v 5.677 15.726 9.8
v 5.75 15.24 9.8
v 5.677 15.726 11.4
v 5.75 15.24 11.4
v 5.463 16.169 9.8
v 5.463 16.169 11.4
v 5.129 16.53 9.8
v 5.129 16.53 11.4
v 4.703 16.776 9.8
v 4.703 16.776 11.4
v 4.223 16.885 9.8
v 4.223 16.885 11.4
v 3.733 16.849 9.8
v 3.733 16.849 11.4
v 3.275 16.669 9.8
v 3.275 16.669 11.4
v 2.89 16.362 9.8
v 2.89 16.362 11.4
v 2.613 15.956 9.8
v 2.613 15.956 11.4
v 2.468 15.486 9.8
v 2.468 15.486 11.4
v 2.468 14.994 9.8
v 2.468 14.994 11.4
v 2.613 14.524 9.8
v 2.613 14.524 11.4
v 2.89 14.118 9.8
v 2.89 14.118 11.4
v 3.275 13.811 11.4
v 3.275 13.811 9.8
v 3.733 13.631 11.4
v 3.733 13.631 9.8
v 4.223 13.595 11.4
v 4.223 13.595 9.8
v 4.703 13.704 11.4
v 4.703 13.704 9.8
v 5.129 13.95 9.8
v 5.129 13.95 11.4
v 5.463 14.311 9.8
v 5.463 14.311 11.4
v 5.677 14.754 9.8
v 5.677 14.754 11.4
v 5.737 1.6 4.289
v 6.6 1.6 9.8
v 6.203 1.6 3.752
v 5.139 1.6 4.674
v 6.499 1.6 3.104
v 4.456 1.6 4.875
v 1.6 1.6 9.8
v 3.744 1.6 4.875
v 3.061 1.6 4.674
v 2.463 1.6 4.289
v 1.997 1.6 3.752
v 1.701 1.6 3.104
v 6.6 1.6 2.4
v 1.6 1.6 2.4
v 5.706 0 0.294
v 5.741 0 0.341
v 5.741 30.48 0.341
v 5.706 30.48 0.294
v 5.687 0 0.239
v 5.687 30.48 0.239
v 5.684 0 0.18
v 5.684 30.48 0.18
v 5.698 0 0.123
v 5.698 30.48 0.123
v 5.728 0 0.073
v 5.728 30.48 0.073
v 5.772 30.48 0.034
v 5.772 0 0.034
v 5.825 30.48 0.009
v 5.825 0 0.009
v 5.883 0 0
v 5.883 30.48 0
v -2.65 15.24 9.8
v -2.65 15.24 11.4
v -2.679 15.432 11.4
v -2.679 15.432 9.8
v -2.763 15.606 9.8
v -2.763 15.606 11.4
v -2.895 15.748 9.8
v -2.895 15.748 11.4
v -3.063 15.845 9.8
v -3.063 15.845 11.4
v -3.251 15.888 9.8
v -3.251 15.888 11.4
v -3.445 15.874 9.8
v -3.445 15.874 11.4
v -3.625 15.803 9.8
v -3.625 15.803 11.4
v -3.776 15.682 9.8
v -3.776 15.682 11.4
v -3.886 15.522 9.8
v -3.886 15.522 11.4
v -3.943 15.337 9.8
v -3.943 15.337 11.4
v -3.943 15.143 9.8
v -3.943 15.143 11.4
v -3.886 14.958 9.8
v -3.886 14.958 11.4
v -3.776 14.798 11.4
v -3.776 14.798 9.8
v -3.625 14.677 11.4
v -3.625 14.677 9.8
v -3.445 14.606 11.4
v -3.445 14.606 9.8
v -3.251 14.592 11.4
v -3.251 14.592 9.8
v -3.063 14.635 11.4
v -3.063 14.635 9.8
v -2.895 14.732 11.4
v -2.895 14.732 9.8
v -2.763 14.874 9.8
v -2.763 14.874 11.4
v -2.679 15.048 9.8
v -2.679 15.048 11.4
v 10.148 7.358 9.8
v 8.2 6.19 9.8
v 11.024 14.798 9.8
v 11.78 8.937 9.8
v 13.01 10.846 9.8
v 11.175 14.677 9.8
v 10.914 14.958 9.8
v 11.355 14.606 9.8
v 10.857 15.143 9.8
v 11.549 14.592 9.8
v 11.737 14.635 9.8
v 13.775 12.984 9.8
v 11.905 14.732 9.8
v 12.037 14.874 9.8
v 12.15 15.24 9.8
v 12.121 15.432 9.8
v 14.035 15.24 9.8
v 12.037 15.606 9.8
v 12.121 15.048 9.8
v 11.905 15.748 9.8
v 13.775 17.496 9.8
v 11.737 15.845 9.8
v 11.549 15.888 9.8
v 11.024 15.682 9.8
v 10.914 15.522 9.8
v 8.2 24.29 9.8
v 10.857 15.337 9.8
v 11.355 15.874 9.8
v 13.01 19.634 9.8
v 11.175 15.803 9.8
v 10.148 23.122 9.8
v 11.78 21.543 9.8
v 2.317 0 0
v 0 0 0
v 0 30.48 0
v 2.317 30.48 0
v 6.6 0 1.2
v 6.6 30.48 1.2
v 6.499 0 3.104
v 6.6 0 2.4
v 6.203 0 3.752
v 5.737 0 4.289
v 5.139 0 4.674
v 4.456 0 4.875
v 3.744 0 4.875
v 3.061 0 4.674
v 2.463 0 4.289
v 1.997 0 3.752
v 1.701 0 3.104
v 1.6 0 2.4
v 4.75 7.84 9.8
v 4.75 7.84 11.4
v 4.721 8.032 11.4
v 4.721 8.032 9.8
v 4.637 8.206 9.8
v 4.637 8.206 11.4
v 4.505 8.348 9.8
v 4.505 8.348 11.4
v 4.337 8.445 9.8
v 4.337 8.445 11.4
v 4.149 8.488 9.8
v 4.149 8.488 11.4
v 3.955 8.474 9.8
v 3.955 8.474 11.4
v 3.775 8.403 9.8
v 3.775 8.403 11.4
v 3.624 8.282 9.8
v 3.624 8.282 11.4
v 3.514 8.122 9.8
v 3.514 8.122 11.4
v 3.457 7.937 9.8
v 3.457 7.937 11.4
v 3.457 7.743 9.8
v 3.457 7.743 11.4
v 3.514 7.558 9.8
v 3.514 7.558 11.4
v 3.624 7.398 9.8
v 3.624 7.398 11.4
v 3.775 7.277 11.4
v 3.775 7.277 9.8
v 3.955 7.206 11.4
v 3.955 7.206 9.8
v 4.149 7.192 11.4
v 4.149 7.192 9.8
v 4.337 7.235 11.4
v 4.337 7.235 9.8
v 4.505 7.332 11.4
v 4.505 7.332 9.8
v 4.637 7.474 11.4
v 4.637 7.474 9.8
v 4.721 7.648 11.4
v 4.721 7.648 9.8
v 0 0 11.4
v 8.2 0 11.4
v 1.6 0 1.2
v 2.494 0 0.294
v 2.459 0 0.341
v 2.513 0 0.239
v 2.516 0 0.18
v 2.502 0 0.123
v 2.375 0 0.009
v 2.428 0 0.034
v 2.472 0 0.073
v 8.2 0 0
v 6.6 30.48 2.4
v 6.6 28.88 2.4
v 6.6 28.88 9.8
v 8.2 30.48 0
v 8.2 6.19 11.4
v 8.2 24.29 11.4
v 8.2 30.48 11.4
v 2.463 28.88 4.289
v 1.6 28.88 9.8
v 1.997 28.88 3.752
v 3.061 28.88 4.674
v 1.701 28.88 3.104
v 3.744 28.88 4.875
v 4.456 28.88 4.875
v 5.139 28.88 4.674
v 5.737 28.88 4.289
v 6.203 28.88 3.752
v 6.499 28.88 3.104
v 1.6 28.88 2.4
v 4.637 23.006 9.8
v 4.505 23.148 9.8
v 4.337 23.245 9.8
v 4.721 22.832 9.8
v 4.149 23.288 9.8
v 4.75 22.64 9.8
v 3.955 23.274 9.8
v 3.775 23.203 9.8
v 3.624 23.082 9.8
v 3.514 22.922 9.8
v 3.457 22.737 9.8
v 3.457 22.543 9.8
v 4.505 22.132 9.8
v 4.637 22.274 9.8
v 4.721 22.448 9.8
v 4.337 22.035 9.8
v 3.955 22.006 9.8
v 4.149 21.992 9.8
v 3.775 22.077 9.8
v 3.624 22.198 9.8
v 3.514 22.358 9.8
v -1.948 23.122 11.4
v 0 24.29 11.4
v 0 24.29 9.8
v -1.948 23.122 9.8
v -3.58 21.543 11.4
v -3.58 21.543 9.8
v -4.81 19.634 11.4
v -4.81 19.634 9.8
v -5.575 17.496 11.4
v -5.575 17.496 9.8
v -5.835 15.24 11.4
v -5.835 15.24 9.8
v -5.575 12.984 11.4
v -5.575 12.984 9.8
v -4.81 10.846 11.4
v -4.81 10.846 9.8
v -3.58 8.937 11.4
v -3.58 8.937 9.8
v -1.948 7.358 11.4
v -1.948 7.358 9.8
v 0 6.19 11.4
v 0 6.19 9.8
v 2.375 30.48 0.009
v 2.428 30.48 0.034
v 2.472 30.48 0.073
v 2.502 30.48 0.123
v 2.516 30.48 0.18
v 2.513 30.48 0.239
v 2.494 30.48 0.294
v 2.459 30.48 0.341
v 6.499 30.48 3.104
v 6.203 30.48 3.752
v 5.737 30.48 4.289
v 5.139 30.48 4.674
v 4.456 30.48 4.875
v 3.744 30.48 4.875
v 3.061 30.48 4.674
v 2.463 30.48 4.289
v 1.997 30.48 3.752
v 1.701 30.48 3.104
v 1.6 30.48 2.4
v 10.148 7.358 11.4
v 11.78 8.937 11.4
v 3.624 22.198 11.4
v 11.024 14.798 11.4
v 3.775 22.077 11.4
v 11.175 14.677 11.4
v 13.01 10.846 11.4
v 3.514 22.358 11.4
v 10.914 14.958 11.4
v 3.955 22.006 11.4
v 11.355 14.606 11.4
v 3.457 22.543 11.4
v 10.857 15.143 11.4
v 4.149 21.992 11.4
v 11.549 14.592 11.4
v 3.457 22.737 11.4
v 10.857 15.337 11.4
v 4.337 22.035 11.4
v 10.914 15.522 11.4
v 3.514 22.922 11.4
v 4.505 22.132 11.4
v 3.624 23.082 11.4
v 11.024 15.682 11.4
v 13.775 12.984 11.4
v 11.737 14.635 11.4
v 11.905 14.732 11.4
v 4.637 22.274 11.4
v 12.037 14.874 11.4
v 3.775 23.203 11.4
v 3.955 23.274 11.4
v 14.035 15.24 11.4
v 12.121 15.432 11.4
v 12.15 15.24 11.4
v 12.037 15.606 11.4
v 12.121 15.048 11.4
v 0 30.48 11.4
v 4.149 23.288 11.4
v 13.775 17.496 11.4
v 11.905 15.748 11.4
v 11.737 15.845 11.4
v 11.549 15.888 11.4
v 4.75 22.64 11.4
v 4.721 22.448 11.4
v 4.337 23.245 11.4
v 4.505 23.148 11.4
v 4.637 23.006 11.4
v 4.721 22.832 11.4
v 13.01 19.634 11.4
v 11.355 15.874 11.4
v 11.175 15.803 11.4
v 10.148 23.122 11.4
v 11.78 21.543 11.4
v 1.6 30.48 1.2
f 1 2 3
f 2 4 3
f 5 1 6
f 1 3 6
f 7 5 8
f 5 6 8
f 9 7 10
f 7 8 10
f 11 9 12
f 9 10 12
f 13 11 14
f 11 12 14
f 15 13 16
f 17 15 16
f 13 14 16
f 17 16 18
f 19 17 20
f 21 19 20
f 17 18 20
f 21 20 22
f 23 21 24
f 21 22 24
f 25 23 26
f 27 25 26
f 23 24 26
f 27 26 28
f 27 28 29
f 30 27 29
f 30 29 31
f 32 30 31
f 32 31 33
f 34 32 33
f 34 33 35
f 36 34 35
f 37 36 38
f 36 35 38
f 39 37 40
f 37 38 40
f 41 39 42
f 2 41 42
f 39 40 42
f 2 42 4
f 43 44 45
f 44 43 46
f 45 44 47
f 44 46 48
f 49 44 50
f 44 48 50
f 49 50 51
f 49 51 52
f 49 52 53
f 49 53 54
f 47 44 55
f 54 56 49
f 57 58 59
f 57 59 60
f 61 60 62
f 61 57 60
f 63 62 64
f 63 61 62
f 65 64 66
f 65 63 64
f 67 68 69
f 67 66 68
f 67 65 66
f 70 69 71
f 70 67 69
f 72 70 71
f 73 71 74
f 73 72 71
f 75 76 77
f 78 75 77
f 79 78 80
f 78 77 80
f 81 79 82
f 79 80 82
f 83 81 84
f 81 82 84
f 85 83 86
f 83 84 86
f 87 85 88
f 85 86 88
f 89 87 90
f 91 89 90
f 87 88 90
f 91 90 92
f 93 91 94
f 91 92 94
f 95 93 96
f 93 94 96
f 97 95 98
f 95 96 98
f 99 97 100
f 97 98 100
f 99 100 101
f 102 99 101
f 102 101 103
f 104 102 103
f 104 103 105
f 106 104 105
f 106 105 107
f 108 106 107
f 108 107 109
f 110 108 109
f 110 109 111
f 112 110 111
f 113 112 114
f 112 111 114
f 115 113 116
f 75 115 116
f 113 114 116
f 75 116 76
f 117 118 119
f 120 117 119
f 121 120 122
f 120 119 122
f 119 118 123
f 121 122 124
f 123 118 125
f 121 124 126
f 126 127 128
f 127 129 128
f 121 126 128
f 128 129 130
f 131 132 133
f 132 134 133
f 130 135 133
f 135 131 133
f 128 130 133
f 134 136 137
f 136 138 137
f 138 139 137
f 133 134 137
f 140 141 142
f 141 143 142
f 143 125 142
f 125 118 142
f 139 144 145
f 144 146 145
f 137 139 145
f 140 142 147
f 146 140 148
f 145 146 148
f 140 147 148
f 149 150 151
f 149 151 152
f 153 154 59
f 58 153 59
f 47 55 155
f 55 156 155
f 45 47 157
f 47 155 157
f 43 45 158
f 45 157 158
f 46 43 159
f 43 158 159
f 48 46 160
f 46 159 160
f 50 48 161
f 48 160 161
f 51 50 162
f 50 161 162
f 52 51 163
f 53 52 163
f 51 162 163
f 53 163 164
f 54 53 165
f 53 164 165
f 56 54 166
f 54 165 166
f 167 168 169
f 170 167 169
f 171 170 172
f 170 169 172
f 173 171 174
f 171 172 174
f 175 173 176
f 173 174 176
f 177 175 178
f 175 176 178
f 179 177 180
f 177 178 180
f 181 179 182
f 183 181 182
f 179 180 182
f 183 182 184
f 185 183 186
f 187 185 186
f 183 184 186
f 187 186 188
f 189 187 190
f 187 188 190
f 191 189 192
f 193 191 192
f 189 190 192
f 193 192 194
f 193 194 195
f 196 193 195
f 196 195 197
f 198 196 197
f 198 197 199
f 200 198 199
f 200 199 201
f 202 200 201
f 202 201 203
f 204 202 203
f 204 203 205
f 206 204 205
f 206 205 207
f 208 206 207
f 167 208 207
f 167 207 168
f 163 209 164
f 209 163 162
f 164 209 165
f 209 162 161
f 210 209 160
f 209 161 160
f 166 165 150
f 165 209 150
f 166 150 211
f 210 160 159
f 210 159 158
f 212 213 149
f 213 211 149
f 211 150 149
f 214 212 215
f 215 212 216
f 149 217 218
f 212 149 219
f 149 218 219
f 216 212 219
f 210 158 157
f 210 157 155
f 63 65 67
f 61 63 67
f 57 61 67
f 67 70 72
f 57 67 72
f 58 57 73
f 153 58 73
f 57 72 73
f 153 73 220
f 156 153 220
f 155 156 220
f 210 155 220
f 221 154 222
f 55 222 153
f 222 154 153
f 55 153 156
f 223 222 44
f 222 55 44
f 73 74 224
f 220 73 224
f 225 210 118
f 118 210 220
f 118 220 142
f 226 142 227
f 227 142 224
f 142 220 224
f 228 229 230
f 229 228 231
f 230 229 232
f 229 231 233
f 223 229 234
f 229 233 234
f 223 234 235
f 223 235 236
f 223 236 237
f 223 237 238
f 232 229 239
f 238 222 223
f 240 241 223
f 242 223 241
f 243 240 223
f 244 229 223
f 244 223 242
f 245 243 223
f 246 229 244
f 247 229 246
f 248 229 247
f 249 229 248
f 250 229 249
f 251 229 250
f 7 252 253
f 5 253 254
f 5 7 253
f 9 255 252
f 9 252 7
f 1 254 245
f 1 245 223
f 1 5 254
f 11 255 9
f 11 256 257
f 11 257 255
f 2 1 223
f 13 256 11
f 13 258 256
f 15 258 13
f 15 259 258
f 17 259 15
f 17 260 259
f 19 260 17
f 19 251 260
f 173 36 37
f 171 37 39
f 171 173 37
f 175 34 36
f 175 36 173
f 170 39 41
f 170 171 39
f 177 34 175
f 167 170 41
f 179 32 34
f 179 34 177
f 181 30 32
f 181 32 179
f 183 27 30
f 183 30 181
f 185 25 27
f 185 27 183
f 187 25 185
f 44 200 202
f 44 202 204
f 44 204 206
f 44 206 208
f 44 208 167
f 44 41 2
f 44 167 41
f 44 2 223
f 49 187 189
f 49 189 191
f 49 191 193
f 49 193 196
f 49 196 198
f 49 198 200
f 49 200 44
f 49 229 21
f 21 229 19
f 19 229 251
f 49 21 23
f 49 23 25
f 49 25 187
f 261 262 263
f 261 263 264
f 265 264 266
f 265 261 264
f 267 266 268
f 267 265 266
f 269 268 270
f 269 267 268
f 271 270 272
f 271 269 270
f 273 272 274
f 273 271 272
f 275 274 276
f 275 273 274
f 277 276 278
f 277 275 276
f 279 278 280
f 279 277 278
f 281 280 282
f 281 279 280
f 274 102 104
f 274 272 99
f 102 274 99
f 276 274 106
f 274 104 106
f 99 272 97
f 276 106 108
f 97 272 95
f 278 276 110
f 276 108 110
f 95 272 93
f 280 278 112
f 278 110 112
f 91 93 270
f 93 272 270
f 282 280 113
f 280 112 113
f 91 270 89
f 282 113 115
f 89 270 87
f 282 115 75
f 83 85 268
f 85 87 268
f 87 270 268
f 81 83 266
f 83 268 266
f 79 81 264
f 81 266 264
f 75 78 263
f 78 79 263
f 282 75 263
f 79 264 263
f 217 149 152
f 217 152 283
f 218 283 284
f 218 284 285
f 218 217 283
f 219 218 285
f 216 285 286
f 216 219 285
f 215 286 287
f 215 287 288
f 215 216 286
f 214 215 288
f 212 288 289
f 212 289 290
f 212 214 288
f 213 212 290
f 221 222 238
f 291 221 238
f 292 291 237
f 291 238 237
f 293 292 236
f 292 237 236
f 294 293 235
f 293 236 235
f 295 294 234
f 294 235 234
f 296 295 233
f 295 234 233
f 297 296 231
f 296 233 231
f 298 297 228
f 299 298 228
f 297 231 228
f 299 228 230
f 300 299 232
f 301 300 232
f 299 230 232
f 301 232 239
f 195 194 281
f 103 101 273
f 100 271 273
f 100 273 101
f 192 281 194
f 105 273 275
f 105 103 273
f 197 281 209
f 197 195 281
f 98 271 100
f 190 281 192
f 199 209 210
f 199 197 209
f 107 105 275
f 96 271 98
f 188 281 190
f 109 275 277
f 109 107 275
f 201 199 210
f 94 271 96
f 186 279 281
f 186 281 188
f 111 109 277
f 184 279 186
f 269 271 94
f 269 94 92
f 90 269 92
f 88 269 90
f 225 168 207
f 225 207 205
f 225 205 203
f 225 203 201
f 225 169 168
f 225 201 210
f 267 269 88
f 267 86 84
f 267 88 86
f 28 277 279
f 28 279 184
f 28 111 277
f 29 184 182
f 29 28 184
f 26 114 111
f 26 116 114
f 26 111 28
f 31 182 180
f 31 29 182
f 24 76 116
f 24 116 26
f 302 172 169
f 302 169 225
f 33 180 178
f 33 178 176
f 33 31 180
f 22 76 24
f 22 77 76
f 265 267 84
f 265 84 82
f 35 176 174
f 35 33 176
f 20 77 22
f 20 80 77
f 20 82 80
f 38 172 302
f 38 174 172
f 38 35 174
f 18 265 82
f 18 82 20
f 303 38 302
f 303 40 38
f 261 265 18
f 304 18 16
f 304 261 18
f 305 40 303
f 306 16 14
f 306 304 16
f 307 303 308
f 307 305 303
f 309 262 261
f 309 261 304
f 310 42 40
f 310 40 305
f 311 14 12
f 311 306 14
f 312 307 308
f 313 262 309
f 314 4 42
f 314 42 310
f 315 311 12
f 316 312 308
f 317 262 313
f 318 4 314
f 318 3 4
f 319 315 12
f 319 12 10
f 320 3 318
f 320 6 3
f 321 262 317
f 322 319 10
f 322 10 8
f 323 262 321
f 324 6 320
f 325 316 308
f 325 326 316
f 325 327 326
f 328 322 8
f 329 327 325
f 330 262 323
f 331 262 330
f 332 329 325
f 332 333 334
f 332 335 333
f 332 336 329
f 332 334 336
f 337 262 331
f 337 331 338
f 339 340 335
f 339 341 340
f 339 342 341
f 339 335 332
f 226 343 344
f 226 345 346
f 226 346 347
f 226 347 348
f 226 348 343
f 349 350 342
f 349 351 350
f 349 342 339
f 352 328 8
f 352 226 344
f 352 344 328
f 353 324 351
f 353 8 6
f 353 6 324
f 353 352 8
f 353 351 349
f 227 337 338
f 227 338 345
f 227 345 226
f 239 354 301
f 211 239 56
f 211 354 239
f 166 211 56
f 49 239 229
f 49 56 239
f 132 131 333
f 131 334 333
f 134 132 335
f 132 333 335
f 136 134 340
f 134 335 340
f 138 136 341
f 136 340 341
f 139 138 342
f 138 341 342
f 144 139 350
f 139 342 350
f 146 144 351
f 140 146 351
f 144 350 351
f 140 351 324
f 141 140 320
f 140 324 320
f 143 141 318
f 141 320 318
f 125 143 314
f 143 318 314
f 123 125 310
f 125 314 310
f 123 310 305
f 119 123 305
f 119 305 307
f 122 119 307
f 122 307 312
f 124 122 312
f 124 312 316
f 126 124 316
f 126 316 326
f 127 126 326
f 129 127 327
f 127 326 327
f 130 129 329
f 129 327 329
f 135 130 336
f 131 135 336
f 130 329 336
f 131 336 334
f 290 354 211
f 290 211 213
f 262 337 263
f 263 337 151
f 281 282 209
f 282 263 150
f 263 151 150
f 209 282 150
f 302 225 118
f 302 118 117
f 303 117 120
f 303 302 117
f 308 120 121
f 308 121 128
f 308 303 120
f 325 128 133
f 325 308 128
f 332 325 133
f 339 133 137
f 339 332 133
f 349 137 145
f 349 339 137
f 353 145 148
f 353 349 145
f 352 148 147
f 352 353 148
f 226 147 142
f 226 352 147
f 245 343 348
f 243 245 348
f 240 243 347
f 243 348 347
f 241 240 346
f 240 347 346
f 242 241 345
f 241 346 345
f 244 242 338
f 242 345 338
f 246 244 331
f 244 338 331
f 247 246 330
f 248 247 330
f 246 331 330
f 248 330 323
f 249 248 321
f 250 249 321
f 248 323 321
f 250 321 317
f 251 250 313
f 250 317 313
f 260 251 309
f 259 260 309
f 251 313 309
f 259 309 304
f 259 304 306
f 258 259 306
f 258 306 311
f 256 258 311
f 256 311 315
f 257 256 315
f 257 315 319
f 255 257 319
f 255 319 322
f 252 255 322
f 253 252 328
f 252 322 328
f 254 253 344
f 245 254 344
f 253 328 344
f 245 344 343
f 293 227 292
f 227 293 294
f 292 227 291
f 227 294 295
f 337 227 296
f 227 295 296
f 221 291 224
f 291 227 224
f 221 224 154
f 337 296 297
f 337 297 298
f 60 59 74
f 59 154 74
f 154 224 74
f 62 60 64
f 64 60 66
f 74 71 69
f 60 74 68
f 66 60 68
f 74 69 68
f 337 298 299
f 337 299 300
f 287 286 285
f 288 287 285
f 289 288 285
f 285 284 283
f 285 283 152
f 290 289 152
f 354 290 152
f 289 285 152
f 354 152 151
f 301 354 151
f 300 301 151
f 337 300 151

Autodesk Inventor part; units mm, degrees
ref_plane "YZ Plane" through (0, 0, 0) normal (1, 0, 0) x (0, 1, 0)
ref_plane "XZ Plane" through (0, 0, 0) normal (0, 1, 0) x (-1, 0, 0)
ref_plane "XY Plane" through (0, 0, 0) normal (0, 0, 1) x (1, 0, 0)
sketch "Sketch1" plane through (0, 0, 0) normal (0, 0, 1) x (1, 0, 0)
  line L0 (0, 0) -> (8.2, 0)
  line L1 (8.2, 0) -> (8.2, 30.48)
  line L2 (8.2, 30.48) -> (0, 30.48)
  line L3 (0, 30.48) -> (0, 0)
  line L4 (6.6, 28.88) -> (6.6, 1.6)
  line L5 (6.6, 1.6) -> (1.6, 1.6)
  line L6 (1.6, 1.6) -> (1.6, 28.88)
  line L7 (1.6, 28.88) -> (6.6, 28.88)
  dimension "d0" = 30.48
  dimension "d1" = 8.2
  dimension "d2" = 1.6
extrude "Extrusion1" add sketch "Sketch1" along normal blind 11.4
sketch "Sketch2" plane through (0, 0, 0) normal (0, -1, 0) x (1, 0, 0)
  line L0 (6.6, 0) -> (6.6, 11.4) projected
  line L1 (1.6, 0) -> (1.6, 11.4) projected
  line L2 (0, 0) -> (8.2, 0) projected
  line L3 (1.6, 0) -> (1.6, 2.4)
  line L4 (1.6, 0) -> (1.6, 11.4) projected
  line L5 (6.6, 0) -> (6.6, 2.4)
  line L6 (6.6, 0) -> (6.6, 11.4) projected
  line L7 (1.6, 0) -> (6.6, 0)
  arc A0 (6.6, 2.4) -> (1.6, 2.4) centre (4.1, 2.4) ccw
  dimension "d5" = 2.4
  dimension "d6" = 2.4
extrude "Extrusion2" cut sketch "Sketch2" against normal up to surface (30.48 mm away)
sketch "Sketch3" plane through (0, 0, 0) normal (-1, 0, 0) x (0, 0, 1)
  line L0 (0, 30.48) -> (0, 0) projected
  line L1 (0, 0) -> (11.4, 0) projected
  line L2 (11.4, 30.48) -> (11.4, 0) projected
  line L3 (0, 30.48) -> (11.4, 30.48) projected
  line L4 (0, 0) -> (11.4, 0) projected
  line L5 (11.4, 30.48) -> (9.8, 30.48)
  line L6 (9.8, 30.48) -> (9.8, 0)
  line L7 (9.8, 0) -> (11.4, 0)
  line L8 (11.4, 0) -> (11.4, 30.48)
  dimension "d9" = 1.6
extrude "Extrusion3" add sketch "Sketch3" against normal up to next contours L3 L2 L1 L6
sketch "Sketch4" plane through (0, 0, 11.4) normal (0, 0, 1) x (1, 0, 0)
  line L0 (0, 0) -> (8.2, 0) projected
  line L1 (8.2, 0) -> (8.2, 30.48) projected
  line L2 (8.2, 30.48) -> (0, 30.48) projected
  line L3 (0, 30.48) -> (0, 0) projected
  line L4 (6.6, 0) -> (1.6, 0) projected
  line L5 (4.1, 0) -> (4.1, 30.48)
  line L6 (1.6, 30.48) -> (6.6, 30.48) projected
  line L7 (8.2, 0) -> (0, 30.48)
  line L8 (8.2, 30.48) -> (0, 0) construction
  circle A0 centre (4.1, 7.84) radius 0.65
  circle A1 centre (4.1, 22.64) radius 0.65
  point P0 (4.1, 15.24)
  dimension "d12" = 7.4
  dimension "d13" = 7.4
  dimension "d14" = 1.3
  dimension "d15" = 1.3
extrude "Extrusion4" cut sketch "Sketch4" against normal up to next contours A0 L5 | L5 A0 | A1 L5 | L5 A1
sketch "Sketch5" plane through (0, 0, 11.4) normal (0, 0, 1) x (1, 0, 0)
  circle A0 centre (4.1, 7.84) radius 0.65 projected
  circle A1 centre (4.1, 22.64) radius 0.65 projected
  line L0 (0, 0) -> (8.2, 0) projected
  line L1 (8.2, 0) -> (8.2, 30.48) projected
  line L2 (8.2, 30.48) -> (0, 30.48) projected
  line L3 (0, 30.48) -> (0, 0) projected
  line L4 (8.2, 0) -> (0, 30.48)
  line L5 (0, 0) -> (8.2, 30.48)
  circle A2 centre (4.1, 15.24) radius 9.935
  dimension "d18" = 19.87
extrude "Extrusion5" add sketch "Sketch5" against normal blind 1.6 contours A2 L3 | L3 A2 L4 L5 | L5 L4 A2 | A2 L4 L5 L1 | L1 A2 | L4 A2 L5
sketch "Sketch6" plane through (0, 0, 11.4) normal (0, 0, 1) x (1, 0, 0)
  line L0 (1.6, 28.88) -> (1.6, 1.6) projected
  circle A0 centre (4.1, 22.64) radius 0.65 projected
  circle A1 centre (4.1, 7.84) radius 0.65 projected
  line L1 (0, 6.1905) -> (0, 0) projected
  line L2 (0, 0) -> (8.2, 0) projected
  line L3 (8.2, 0) -> (8.2, 6.1905) projected
  arc A2 (8.2, 6.1905) -> (8.2, 24.2895) centre (4.1, 15.24) ccw projected
  line L4 (8.2, 24.2895) -> (8.2, 30.48) projected
  line L5 (8.2, 30.48) -> (0, 30.48) projected
  line L6 (0, 30.48) -> (0, 24.2895) projected
  arc A3 (0, 24.2895) -> (0, 6.1905) centre (4.1, 15.24) ccw projected
  line L7 (8.2, 0) -> (0, 30.48)
  line L8 (8.2, 30.48) -> (0, 0)
  arc A4 (0, 24.2895) -> (0, 6.1905) centre (4.1, 15.24) ccw projected
  line L9 (-5.835, 15.24) -> (14.035, 15.24) construction
  arc A5 (8.2, 6.1905) -> (8.2, 24.2895) centre (4.1, 15.24) ccw projected
  circle A6 centre (-3.3, 15.24) radius 0.65
  circle A7 centre (11.5, 15.24) radius 0.65
  dimension "d21" = 7.4
  dimension "d22" = 7.4
  dimension "d23" = 1.3
  dimension "d24" = 1.3
extrude "Extrusion6" cut sketch "Sketch6" against normal up to next contours A6 | A7
sketch "Sketch7" plane through (0, 0, 11.4) normal (0, 0, 1) x (1, 0, 0)
  circle A0 centre (11.5, 15.24) radius 0.65 projected
  circle A1 centre (-3.3, 15.24) radius 0.65 projected
  circle A2 centre (4.1, 22.64) radius 0.65 projected
  circle A3 centre (4.1, 7.84) radius 0.65 projected
  line L0 (0, 6.1905) -> (0, 0) projected
  line L1 (0, 0) -> (8.2, 0) projected
  line L2 (8.2, 0) -> (8.2, 6.1905) projected
  arc A4 (8.2, 6.1905) -> (8.2, 24.2895) centre (4.1, 15.24) ccw projected
  line L3 (8.2, 24.2895) -> (8.2, 30.48) projected
  line L4 (8.2, 30.48) -> (0, 30.48) projected
  line L5 (0, 30.48) -> (0, 24.2895) projected
  arc A5 (0, 24.2895) -> (0, 6.1905) centre (4.1, 15.24) ccw projected
  line L6 (0, 0) -> (8.2, 30.48)
  line L7 (0, 30.48) -> (8.2, 0)
  circle A6 centre (4.1, 15.24) radius 1.65
  dimension "d27" = 3.3
extrude "Extrusion7" cut sketch "Sketch7" against normal blind 1.6 contours A6 L7 L6 | L6 L7 A6 | L7 L6 A6 | L7 A6 L6
sketch "Sketch8" plane through (6.6, 30.48, 0) normal (0, 1, 0) x (1, 0, 0)
  line L0 (-5, -2.4) -> (-5, 0) projected
  line L1 (0, 0) -> (0, -2.4) projected
  line L2 (-5, -1.2) -> (-3.8, 0)
  line L3 (-5, -1.2) -> (-2.8401, -1.2) construction
  line L4 (-5, 0) -> (-3.8, 0)
  line L5 (0, -1.2) -> (-1.2, 0)
  line L6 (0, 0) -> (-1.2, 0)
  point P0 (-6.6, 0)
  dimension "d30" = 45
extrude "Extrusion8" add sketch "Sketch8" against normal up to surface (30.48 mm away)
fillet "Fillet1" radius 0.2 2 edges at (2.8, 15.24, 0) (5.4, 15.24, 0)
properties part number "CarFrontAxel"
